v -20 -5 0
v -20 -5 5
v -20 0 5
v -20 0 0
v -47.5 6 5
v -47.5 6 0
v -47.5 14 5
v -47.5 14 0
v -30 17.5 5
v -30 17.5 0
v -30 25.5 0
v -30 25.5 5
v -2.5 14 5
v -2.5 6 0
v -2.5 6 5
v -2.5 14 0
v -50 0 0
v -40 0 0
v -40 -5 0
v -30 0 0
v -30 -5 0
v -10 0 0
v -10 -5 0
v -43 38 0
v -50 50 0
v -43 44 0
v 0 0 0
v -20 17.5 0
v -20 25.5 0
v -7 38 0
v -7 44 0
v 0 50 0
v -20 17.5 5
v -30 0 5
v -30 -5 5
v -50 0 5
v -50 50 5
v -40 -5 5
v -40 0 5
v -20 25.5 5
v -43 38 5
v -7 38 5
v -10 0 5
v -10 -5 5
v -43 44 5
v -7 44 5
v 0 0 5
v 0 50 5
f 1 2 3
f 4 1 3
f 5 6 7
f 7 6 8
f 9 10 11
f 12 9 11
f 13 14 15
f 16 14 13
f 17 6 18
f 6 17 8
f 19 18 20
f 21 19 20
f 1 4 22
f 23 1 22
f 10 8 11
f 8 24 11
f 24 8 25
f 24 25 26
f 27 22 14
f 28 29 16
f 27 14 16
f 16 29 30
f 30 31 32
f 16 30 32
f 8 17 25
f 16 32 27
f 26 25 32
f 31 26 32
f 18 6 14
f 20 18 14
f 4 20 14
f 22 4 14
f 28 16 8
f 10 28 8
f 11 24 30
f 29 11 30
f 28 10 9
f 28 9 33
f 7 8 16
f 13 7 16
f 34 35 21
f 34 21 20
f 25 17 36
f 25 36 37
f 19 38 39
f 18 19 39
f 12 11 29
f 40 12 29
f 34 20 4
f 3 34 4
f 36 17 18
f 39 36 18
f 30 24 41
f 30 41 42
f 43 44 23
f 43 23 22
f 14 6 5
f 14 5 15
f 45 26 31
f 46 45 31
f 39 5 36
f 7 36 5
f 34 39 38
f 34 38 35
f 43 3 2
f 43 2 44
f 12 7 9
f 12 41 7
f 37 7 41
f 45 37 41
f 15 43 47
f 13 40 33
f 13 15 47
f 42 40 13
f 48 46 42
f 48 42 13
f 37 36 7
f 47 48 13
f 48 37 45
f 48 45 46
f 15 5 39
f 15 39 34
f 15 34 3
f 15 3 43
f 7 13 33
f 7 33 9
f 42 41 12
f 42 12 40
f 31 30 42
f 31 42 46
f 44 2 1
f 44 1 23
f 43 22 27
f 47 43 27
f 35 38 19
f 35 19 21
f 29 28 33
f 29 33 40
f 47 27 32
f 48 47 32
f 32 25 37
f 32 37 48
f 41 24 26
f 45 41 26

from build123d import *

# Parameters (mm, degrees)
ESQUISSE1_W        = 50
ESQUISSE1_H        = 50
ESQUISSE1_W_2      = 36
ESQUISSE1_H_2      = 6
ESQUISSE1_W_3      = 10
ESQUISSE1_H_3      = 8
ESQUISSE1_W_4      = 45
BOSS_EXTRU_1_DEPTH = 5
ESQUISSE11_W       = 10
ESQUISSE11_H       = 5
BOSS_EXTRU_2_DEPTH = 5


with BuildPart() as part:
    # Esquisse1 → Boss.-Extru.1 (new body)
    with BuildSketch(Plane.XY):
        with Locations((-25, 25)):
            Rectangle(ESQUISSE1_W, ESQUISSE1_H)
        with Locations((-25, 41)):
            Rectangle(ESQUISSE1_W_2, ESQUISSE1_H_2, mode=Mode.SUBTRACT)
        with Locations((-25, 21.5)):
            Rectangle(ESQUISSE1_W_3, ESQUISSE1_H_3, mode=Mode.SUBTRACT)
        with Locations((-25, 10)):
            Rectangle(ESQUISSE1_W_4, ESQUISSE1_H_3, mode=Mode.SUBTRACT)
    extrude(amount=BOSS_EXTRU_1_DEPTH)

    # Esquisse11 → Boss.-Extru.2 (add)
    with BuildSketch(Plane.XY.offset(5)):
        with Locations((-35, -2.5)):
            Rectangle(ESQUISSE11_W, ESQUISSE11_H)
        with Locations((-15, -2.5)):
            Rectangle(ESQUISSE11_W, ESQUISSE11_H)
    extrude(amount=-BOSS_EXTRU_2_DEPTH)


solid = part.part
